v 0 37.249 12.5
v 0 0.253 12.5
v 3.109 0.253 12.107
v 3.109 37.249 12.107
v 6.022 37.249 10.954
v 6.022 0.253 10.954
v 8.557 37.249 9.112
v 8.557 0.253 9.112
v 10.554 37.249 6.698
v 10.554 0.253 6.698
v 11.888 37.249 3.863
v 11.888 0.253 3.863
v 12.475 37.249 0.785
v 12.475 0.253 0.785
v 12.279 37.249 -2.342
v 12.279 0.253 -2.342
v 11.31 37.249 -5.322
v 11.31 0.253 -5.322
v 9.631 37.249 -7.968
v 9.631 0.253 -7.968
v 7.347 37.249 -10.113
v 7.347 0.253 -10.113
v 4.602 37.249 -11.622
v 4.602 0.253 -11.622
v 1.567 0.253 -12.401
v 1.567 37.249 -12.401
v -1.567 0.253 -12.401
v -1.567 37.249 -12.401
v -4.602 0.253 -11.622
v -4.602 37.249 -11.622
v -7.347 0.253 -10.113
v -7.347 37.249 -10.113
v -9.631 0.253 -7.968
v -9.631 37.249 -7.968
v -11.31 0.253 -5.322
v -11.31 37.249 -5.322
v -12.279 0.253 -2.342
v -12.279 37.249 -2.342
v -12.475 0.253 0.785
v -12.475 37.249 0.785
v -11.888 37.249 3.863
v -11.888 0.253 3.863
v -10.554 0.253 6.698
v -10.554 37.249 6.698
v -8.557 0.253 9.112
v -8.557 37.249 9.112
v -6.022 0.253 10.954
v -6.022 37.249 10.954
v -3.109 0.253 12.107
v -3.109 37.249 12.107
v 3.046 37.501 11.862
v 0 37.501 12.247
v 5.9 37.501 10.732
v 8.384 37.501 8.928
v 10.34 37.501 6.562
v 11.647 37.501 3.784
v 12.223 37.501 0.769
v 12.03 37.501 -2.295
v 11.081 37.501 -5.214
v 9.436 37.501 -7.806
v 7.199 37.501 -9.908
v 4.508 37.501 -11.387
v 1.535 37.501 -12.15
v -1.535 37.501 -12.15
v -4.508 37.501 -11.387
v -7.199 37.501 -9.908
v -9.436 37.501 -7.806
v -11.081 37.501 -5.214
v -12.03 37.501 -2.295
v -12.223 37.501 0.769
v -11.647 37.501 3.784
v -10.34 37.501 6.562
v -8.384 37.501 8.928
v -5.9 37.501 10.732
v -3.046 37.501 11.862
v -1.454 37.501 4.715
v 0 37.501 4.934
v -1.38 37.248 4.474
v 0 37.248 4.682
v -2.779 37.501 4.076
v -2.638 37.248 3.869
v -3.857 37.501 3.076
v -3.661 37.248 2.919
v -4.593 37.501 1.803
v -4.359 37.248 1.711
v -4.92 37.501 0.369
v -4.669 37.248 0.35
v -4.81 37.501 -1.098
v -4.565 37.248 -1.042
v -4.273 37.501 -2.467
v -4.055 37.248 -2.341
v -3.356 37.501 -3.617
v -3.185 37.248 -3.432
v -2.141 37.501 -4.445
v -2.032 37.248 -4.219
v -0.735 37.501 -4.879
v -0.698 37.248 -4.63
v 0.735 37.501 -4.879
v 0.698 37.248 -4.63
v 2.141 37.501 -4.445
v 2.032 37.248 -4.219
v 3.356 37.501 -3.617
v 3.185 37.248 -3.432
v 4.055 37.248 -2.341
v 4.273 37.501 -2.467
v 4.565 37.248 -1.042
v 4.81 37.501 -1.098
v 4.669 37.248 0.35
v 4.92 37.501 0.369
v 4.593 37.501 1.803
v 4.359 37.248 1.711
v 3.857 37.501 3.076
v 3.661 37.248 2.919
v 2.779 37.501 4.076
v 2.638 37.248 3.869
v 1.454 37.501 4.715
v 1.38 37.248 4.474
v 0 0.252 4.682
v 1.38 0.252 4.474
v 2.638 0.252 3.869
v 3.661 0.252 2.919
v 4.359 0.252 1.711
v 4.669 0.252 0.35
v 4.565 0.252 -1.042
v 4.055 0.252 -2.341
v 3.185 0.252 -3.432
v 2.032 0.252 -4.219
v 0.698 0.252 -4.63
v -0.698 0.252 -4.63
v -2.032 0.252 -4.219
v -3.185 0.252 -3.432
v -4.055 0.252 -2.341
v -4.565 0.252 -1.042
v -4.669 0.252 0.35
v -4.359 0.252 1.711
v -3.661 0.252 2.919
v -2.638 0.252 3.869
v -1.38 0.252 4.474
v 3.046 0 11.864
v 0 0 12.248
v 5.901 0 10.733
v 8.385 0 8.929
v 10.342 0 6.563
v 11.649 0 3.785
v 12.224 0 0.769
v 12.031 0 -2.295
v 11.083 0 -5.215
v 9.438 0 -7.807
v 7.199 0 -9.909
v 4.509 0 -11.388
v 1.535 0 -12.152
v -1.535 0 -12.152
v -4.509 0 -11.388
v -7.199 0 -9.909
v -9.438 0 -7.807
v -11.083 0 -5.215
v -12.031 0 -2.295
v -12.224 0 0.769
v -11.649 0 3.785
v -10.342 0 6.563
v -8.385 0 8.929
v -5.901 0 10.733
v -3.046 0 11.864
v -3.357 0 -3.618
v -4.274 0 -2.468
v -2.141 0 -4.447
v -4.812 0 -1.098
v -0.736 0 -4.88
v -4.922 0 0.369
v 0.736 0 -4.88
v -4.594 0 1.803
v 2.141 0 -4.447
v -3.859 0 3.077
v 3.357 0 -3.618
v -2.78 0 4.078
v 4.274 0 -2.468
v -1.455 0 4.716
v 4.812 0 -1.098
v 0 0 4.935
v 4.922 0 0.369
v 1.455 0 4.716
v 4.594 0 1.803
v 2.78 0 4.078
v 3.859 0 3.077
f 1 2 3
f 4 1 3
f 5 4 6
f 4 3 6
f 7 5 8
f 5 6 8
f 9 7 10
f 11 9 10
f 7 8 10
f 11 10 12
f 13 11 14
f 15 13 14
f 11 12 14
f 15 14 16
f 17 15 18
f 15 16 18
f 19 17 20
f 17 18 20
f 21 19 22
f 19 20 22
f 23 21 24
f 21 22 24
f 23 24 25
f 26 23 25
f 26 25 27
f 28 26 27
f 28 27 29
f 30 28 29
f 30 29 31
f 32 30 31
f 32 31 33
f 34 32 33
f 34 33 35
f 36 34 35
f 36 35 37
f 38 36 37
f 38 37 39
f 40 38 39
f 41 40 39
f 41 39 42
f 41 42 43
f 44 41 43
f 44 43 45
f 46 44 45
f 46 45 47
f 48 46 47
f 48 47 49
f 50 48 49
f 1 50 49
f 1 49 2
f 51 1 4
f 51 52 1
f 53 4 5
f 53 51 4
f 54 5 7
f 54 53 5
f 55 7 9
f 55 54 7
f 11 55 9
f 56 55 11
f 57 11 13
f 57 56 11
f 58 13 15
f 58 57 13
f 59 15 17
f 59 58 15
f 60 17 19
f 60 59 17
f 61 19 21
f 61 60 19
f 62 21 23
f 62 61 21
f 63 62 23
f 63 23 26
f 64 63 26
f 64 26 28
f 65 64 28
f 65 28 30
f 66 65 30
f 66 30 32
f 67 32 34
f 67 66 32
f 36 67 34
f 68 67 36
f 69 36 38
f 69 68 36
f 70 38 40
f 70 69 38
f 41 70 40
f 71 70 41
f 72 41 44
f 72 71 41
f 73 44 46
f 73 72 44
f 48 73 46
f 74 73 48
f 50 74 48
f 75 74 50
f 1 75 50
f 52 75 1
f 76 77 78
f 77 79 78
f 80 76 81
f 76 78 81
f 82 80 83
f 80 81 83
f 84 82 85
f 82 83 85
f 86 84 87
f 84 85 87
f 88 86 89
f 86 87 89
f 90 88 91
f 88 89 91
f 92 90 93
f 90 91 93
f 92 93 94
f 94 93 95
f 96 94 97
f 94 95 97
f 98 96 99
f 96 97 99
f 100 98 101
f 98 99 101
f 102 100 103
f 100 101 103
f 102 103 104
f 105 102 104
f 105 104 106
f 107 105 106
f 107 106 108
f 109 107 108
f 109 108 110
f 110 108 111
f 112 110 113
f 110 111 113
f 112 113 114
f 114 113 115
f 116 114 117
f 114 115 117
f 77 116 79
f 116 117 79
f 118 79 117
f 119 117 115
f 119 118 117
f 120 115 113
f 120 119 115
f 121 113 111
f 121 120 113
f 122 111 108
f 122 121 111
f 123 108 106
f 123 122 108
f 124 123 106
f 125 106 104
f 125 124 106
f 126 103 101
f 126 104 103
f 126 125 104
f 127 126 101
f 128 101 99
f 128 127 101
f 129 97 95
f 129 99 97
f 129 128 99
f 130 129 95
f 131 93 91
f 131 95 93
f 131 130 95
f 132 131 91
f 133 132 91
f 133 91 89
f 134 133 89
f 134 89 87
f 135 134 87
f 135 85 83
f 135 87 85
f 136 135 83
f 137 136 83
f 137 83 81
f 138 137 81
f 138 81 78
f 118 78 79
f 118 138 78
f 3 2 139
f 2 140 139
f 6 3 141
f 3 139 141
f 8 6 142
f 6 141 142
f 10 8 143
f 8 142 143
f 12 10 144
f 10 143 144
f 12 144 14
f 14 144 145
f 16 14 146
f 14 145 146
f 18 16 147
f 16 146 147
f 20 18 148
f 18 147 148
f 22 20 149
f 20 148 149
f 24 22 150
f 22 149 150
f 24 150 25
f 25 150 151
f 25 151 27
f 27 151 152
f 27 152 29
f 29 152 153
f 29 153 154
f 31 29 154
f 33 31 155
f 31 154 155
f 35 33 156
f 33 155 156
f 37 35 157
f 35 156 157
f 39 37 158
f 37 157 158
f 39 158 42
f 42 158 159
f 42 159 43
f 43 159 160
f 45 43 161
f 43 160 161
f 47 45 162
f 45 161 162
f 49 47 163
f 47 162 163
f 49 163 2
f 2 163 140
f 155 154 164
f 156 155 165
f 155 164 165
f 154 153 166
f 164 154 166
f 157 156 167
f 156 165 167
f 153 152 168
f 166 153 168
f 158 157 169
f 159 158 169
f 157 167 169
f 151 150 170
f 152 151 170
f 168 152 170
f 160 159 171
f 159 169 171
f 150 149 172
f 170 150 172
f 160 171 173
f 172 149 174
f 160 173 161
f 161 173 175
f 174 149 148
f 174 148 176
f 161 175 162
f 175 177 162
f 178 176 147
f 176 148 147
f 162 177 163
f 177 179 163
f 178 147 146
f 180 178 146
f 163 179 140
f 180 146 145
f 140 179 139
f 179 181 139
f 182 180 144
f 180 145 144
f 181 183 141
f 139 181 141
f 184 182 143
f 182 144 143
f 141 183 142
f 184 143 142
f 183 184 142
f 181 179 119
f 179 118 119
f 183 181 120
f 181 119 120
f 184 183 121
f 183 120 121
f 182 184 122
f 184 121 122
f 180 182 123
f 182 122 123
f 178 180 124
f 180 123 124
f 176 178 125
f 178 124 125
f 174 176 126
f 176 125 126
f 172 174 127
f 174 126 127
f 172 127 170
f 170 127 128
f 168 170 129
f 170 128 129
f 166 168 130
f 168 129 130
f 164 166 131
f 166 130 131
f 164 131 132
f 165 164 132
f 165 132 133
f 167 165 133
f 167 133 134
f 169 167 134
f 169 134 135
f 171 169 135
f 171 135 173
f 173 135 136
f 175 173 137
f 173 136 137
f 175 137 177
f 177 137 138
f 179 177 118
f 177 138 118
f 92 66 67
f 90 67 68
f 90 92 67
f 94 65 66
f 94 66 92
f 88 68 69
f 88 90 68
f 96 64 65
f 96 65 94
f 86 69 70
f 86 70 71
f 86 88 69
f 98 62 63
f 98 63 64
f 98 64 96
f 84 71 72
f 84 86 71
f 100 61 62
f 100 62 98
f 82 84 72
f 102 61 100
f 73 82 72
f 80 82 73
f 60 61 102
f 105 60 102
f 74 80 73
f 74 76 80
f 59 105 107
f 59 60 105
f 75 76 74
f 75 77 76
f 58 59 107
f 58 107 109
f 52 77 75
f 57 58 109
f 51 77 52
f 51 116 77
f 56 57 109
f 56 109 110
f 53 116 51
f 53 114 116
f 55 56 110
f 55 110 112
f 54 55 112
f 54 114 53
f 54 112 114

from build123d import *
from OCP.BRepFilletAPI import BRepFilletAPI_MakeChamfer

# Parameters (mm, degrees)
SKETCH1_R           = 12.5
BOSS_EXTRUDE1_DEPTH = 37.500835042
SKETCH2_R           = 4.68221709
CUT_EXTRUDE1_DEPTH  = 42.458565205
CHAMFER1_SIZE       = 0.251550273
CHAMFER1_SIZE2      = 0.253157677


with BuildPart() as part:
    # Sketch1 → Boss-Extrude1 (new body)
    with BuildSketch(Plane(origin=(0, 0, 0), x_dir=(1, 0, 0), z_dir=(0, 1, 0))):
        Circle(SKETCH1_R)
    extrude(amount=BOSS_EXTRUDE1_DEPTH)

    # Sketch2 → Cut-Extrude1 (cut, through all)
    with BuildSketch(Plane(origin=(0, 0, 0), x_dir=(1, 0, 0), z_dir=(0, 1, 0))):
        Circle(SKETCH2_R)
    extrude(amount=CUT_EXTRUDE1_DEPTH, mode=Mode.SUBTRACT)

    # Chamfer1: one chamfer whose edges measure the first distance from different faces: ONE call of the kernel's chamfer builder (chamfer() names one face for all edges)
    chamfer1_edges_1 = [part.edges().sort_by_distance(p)[0] for p in [
        (-4.68221709, 37.500835042, 0),
    ]]
    chamfer1_side_1 = [part.faces().sort_by_distance(p)[0] for p in [
        (-12.146446609, 37.500835042, 0),
    ]]
    chamfer1_edges_2 = [part.edges().sort_by_distance(p)[0] for p in [
        (-4.68221709, 0, 0),
    ]]
    chamfer1_side_2 = [part.faces().sort_by_distance(p)[0] for p in [
        (-4.68221709, 18.750417521, 0),
    ]]
    chamfer1_edges_3 = [part.edges().sort_by_distance(p)[0] for p in [
        (-12.5, 0, 0),
    ]]
    chamfer1_side_3 = [part.faces().sort_by_distance(p)[0] for p in [
        (-12.146446609, 0, 0),
    ]]
    chamfer1_edges_4 = [part.edges().sort_by_distance(p)[0] for p in [
        (-12.5, 37.500835042, 0),
    ]]
    chamfer1_side_4 = [part.faces().sort_by_distance(p)[0] for p in [
        (-12.5, 18.750417521, 0),
    ]]
    chamfer1 = BRepFilletAPI_MakeChamfer(part.part.solid().wrapped)
    for e in chamfer1_edges_1:
        chamfer1.Add(CHAMFER1_SIZE, CHAMFER1_SIZE2, e.wrapped, chamfer1_side_1[0].wrapped)  # the first distance lies on this face
    for e in chamfer1_edges_2:
        chamfer1.Add(CHAMFER1_SIZE, CHAMFER1_SIZE2, e.wrapped, chamfer1_side_2[0].wrapped)  # the first distance lies on this face
    for e in chamfer1_edges_3:
        chamfer1.Add(CHAMFER1_SIZE, CHAMFER1_SIZE2, e.wrapped, chamfer1_side_3[0].wrapped)  # the first distance lies on this face
    for e in chamfer1_edges_4:
        chamfer1.Add(CHAMFER1_SIZE, CHAMFER1_SIZE2, e.wrapped, chamfer1_side_4[0].wrapped)  # the first distance lies on this face
    add(Compound.cast(chamfer1.Shape()), mode=Mode.REPLACE)


solid = part.part
